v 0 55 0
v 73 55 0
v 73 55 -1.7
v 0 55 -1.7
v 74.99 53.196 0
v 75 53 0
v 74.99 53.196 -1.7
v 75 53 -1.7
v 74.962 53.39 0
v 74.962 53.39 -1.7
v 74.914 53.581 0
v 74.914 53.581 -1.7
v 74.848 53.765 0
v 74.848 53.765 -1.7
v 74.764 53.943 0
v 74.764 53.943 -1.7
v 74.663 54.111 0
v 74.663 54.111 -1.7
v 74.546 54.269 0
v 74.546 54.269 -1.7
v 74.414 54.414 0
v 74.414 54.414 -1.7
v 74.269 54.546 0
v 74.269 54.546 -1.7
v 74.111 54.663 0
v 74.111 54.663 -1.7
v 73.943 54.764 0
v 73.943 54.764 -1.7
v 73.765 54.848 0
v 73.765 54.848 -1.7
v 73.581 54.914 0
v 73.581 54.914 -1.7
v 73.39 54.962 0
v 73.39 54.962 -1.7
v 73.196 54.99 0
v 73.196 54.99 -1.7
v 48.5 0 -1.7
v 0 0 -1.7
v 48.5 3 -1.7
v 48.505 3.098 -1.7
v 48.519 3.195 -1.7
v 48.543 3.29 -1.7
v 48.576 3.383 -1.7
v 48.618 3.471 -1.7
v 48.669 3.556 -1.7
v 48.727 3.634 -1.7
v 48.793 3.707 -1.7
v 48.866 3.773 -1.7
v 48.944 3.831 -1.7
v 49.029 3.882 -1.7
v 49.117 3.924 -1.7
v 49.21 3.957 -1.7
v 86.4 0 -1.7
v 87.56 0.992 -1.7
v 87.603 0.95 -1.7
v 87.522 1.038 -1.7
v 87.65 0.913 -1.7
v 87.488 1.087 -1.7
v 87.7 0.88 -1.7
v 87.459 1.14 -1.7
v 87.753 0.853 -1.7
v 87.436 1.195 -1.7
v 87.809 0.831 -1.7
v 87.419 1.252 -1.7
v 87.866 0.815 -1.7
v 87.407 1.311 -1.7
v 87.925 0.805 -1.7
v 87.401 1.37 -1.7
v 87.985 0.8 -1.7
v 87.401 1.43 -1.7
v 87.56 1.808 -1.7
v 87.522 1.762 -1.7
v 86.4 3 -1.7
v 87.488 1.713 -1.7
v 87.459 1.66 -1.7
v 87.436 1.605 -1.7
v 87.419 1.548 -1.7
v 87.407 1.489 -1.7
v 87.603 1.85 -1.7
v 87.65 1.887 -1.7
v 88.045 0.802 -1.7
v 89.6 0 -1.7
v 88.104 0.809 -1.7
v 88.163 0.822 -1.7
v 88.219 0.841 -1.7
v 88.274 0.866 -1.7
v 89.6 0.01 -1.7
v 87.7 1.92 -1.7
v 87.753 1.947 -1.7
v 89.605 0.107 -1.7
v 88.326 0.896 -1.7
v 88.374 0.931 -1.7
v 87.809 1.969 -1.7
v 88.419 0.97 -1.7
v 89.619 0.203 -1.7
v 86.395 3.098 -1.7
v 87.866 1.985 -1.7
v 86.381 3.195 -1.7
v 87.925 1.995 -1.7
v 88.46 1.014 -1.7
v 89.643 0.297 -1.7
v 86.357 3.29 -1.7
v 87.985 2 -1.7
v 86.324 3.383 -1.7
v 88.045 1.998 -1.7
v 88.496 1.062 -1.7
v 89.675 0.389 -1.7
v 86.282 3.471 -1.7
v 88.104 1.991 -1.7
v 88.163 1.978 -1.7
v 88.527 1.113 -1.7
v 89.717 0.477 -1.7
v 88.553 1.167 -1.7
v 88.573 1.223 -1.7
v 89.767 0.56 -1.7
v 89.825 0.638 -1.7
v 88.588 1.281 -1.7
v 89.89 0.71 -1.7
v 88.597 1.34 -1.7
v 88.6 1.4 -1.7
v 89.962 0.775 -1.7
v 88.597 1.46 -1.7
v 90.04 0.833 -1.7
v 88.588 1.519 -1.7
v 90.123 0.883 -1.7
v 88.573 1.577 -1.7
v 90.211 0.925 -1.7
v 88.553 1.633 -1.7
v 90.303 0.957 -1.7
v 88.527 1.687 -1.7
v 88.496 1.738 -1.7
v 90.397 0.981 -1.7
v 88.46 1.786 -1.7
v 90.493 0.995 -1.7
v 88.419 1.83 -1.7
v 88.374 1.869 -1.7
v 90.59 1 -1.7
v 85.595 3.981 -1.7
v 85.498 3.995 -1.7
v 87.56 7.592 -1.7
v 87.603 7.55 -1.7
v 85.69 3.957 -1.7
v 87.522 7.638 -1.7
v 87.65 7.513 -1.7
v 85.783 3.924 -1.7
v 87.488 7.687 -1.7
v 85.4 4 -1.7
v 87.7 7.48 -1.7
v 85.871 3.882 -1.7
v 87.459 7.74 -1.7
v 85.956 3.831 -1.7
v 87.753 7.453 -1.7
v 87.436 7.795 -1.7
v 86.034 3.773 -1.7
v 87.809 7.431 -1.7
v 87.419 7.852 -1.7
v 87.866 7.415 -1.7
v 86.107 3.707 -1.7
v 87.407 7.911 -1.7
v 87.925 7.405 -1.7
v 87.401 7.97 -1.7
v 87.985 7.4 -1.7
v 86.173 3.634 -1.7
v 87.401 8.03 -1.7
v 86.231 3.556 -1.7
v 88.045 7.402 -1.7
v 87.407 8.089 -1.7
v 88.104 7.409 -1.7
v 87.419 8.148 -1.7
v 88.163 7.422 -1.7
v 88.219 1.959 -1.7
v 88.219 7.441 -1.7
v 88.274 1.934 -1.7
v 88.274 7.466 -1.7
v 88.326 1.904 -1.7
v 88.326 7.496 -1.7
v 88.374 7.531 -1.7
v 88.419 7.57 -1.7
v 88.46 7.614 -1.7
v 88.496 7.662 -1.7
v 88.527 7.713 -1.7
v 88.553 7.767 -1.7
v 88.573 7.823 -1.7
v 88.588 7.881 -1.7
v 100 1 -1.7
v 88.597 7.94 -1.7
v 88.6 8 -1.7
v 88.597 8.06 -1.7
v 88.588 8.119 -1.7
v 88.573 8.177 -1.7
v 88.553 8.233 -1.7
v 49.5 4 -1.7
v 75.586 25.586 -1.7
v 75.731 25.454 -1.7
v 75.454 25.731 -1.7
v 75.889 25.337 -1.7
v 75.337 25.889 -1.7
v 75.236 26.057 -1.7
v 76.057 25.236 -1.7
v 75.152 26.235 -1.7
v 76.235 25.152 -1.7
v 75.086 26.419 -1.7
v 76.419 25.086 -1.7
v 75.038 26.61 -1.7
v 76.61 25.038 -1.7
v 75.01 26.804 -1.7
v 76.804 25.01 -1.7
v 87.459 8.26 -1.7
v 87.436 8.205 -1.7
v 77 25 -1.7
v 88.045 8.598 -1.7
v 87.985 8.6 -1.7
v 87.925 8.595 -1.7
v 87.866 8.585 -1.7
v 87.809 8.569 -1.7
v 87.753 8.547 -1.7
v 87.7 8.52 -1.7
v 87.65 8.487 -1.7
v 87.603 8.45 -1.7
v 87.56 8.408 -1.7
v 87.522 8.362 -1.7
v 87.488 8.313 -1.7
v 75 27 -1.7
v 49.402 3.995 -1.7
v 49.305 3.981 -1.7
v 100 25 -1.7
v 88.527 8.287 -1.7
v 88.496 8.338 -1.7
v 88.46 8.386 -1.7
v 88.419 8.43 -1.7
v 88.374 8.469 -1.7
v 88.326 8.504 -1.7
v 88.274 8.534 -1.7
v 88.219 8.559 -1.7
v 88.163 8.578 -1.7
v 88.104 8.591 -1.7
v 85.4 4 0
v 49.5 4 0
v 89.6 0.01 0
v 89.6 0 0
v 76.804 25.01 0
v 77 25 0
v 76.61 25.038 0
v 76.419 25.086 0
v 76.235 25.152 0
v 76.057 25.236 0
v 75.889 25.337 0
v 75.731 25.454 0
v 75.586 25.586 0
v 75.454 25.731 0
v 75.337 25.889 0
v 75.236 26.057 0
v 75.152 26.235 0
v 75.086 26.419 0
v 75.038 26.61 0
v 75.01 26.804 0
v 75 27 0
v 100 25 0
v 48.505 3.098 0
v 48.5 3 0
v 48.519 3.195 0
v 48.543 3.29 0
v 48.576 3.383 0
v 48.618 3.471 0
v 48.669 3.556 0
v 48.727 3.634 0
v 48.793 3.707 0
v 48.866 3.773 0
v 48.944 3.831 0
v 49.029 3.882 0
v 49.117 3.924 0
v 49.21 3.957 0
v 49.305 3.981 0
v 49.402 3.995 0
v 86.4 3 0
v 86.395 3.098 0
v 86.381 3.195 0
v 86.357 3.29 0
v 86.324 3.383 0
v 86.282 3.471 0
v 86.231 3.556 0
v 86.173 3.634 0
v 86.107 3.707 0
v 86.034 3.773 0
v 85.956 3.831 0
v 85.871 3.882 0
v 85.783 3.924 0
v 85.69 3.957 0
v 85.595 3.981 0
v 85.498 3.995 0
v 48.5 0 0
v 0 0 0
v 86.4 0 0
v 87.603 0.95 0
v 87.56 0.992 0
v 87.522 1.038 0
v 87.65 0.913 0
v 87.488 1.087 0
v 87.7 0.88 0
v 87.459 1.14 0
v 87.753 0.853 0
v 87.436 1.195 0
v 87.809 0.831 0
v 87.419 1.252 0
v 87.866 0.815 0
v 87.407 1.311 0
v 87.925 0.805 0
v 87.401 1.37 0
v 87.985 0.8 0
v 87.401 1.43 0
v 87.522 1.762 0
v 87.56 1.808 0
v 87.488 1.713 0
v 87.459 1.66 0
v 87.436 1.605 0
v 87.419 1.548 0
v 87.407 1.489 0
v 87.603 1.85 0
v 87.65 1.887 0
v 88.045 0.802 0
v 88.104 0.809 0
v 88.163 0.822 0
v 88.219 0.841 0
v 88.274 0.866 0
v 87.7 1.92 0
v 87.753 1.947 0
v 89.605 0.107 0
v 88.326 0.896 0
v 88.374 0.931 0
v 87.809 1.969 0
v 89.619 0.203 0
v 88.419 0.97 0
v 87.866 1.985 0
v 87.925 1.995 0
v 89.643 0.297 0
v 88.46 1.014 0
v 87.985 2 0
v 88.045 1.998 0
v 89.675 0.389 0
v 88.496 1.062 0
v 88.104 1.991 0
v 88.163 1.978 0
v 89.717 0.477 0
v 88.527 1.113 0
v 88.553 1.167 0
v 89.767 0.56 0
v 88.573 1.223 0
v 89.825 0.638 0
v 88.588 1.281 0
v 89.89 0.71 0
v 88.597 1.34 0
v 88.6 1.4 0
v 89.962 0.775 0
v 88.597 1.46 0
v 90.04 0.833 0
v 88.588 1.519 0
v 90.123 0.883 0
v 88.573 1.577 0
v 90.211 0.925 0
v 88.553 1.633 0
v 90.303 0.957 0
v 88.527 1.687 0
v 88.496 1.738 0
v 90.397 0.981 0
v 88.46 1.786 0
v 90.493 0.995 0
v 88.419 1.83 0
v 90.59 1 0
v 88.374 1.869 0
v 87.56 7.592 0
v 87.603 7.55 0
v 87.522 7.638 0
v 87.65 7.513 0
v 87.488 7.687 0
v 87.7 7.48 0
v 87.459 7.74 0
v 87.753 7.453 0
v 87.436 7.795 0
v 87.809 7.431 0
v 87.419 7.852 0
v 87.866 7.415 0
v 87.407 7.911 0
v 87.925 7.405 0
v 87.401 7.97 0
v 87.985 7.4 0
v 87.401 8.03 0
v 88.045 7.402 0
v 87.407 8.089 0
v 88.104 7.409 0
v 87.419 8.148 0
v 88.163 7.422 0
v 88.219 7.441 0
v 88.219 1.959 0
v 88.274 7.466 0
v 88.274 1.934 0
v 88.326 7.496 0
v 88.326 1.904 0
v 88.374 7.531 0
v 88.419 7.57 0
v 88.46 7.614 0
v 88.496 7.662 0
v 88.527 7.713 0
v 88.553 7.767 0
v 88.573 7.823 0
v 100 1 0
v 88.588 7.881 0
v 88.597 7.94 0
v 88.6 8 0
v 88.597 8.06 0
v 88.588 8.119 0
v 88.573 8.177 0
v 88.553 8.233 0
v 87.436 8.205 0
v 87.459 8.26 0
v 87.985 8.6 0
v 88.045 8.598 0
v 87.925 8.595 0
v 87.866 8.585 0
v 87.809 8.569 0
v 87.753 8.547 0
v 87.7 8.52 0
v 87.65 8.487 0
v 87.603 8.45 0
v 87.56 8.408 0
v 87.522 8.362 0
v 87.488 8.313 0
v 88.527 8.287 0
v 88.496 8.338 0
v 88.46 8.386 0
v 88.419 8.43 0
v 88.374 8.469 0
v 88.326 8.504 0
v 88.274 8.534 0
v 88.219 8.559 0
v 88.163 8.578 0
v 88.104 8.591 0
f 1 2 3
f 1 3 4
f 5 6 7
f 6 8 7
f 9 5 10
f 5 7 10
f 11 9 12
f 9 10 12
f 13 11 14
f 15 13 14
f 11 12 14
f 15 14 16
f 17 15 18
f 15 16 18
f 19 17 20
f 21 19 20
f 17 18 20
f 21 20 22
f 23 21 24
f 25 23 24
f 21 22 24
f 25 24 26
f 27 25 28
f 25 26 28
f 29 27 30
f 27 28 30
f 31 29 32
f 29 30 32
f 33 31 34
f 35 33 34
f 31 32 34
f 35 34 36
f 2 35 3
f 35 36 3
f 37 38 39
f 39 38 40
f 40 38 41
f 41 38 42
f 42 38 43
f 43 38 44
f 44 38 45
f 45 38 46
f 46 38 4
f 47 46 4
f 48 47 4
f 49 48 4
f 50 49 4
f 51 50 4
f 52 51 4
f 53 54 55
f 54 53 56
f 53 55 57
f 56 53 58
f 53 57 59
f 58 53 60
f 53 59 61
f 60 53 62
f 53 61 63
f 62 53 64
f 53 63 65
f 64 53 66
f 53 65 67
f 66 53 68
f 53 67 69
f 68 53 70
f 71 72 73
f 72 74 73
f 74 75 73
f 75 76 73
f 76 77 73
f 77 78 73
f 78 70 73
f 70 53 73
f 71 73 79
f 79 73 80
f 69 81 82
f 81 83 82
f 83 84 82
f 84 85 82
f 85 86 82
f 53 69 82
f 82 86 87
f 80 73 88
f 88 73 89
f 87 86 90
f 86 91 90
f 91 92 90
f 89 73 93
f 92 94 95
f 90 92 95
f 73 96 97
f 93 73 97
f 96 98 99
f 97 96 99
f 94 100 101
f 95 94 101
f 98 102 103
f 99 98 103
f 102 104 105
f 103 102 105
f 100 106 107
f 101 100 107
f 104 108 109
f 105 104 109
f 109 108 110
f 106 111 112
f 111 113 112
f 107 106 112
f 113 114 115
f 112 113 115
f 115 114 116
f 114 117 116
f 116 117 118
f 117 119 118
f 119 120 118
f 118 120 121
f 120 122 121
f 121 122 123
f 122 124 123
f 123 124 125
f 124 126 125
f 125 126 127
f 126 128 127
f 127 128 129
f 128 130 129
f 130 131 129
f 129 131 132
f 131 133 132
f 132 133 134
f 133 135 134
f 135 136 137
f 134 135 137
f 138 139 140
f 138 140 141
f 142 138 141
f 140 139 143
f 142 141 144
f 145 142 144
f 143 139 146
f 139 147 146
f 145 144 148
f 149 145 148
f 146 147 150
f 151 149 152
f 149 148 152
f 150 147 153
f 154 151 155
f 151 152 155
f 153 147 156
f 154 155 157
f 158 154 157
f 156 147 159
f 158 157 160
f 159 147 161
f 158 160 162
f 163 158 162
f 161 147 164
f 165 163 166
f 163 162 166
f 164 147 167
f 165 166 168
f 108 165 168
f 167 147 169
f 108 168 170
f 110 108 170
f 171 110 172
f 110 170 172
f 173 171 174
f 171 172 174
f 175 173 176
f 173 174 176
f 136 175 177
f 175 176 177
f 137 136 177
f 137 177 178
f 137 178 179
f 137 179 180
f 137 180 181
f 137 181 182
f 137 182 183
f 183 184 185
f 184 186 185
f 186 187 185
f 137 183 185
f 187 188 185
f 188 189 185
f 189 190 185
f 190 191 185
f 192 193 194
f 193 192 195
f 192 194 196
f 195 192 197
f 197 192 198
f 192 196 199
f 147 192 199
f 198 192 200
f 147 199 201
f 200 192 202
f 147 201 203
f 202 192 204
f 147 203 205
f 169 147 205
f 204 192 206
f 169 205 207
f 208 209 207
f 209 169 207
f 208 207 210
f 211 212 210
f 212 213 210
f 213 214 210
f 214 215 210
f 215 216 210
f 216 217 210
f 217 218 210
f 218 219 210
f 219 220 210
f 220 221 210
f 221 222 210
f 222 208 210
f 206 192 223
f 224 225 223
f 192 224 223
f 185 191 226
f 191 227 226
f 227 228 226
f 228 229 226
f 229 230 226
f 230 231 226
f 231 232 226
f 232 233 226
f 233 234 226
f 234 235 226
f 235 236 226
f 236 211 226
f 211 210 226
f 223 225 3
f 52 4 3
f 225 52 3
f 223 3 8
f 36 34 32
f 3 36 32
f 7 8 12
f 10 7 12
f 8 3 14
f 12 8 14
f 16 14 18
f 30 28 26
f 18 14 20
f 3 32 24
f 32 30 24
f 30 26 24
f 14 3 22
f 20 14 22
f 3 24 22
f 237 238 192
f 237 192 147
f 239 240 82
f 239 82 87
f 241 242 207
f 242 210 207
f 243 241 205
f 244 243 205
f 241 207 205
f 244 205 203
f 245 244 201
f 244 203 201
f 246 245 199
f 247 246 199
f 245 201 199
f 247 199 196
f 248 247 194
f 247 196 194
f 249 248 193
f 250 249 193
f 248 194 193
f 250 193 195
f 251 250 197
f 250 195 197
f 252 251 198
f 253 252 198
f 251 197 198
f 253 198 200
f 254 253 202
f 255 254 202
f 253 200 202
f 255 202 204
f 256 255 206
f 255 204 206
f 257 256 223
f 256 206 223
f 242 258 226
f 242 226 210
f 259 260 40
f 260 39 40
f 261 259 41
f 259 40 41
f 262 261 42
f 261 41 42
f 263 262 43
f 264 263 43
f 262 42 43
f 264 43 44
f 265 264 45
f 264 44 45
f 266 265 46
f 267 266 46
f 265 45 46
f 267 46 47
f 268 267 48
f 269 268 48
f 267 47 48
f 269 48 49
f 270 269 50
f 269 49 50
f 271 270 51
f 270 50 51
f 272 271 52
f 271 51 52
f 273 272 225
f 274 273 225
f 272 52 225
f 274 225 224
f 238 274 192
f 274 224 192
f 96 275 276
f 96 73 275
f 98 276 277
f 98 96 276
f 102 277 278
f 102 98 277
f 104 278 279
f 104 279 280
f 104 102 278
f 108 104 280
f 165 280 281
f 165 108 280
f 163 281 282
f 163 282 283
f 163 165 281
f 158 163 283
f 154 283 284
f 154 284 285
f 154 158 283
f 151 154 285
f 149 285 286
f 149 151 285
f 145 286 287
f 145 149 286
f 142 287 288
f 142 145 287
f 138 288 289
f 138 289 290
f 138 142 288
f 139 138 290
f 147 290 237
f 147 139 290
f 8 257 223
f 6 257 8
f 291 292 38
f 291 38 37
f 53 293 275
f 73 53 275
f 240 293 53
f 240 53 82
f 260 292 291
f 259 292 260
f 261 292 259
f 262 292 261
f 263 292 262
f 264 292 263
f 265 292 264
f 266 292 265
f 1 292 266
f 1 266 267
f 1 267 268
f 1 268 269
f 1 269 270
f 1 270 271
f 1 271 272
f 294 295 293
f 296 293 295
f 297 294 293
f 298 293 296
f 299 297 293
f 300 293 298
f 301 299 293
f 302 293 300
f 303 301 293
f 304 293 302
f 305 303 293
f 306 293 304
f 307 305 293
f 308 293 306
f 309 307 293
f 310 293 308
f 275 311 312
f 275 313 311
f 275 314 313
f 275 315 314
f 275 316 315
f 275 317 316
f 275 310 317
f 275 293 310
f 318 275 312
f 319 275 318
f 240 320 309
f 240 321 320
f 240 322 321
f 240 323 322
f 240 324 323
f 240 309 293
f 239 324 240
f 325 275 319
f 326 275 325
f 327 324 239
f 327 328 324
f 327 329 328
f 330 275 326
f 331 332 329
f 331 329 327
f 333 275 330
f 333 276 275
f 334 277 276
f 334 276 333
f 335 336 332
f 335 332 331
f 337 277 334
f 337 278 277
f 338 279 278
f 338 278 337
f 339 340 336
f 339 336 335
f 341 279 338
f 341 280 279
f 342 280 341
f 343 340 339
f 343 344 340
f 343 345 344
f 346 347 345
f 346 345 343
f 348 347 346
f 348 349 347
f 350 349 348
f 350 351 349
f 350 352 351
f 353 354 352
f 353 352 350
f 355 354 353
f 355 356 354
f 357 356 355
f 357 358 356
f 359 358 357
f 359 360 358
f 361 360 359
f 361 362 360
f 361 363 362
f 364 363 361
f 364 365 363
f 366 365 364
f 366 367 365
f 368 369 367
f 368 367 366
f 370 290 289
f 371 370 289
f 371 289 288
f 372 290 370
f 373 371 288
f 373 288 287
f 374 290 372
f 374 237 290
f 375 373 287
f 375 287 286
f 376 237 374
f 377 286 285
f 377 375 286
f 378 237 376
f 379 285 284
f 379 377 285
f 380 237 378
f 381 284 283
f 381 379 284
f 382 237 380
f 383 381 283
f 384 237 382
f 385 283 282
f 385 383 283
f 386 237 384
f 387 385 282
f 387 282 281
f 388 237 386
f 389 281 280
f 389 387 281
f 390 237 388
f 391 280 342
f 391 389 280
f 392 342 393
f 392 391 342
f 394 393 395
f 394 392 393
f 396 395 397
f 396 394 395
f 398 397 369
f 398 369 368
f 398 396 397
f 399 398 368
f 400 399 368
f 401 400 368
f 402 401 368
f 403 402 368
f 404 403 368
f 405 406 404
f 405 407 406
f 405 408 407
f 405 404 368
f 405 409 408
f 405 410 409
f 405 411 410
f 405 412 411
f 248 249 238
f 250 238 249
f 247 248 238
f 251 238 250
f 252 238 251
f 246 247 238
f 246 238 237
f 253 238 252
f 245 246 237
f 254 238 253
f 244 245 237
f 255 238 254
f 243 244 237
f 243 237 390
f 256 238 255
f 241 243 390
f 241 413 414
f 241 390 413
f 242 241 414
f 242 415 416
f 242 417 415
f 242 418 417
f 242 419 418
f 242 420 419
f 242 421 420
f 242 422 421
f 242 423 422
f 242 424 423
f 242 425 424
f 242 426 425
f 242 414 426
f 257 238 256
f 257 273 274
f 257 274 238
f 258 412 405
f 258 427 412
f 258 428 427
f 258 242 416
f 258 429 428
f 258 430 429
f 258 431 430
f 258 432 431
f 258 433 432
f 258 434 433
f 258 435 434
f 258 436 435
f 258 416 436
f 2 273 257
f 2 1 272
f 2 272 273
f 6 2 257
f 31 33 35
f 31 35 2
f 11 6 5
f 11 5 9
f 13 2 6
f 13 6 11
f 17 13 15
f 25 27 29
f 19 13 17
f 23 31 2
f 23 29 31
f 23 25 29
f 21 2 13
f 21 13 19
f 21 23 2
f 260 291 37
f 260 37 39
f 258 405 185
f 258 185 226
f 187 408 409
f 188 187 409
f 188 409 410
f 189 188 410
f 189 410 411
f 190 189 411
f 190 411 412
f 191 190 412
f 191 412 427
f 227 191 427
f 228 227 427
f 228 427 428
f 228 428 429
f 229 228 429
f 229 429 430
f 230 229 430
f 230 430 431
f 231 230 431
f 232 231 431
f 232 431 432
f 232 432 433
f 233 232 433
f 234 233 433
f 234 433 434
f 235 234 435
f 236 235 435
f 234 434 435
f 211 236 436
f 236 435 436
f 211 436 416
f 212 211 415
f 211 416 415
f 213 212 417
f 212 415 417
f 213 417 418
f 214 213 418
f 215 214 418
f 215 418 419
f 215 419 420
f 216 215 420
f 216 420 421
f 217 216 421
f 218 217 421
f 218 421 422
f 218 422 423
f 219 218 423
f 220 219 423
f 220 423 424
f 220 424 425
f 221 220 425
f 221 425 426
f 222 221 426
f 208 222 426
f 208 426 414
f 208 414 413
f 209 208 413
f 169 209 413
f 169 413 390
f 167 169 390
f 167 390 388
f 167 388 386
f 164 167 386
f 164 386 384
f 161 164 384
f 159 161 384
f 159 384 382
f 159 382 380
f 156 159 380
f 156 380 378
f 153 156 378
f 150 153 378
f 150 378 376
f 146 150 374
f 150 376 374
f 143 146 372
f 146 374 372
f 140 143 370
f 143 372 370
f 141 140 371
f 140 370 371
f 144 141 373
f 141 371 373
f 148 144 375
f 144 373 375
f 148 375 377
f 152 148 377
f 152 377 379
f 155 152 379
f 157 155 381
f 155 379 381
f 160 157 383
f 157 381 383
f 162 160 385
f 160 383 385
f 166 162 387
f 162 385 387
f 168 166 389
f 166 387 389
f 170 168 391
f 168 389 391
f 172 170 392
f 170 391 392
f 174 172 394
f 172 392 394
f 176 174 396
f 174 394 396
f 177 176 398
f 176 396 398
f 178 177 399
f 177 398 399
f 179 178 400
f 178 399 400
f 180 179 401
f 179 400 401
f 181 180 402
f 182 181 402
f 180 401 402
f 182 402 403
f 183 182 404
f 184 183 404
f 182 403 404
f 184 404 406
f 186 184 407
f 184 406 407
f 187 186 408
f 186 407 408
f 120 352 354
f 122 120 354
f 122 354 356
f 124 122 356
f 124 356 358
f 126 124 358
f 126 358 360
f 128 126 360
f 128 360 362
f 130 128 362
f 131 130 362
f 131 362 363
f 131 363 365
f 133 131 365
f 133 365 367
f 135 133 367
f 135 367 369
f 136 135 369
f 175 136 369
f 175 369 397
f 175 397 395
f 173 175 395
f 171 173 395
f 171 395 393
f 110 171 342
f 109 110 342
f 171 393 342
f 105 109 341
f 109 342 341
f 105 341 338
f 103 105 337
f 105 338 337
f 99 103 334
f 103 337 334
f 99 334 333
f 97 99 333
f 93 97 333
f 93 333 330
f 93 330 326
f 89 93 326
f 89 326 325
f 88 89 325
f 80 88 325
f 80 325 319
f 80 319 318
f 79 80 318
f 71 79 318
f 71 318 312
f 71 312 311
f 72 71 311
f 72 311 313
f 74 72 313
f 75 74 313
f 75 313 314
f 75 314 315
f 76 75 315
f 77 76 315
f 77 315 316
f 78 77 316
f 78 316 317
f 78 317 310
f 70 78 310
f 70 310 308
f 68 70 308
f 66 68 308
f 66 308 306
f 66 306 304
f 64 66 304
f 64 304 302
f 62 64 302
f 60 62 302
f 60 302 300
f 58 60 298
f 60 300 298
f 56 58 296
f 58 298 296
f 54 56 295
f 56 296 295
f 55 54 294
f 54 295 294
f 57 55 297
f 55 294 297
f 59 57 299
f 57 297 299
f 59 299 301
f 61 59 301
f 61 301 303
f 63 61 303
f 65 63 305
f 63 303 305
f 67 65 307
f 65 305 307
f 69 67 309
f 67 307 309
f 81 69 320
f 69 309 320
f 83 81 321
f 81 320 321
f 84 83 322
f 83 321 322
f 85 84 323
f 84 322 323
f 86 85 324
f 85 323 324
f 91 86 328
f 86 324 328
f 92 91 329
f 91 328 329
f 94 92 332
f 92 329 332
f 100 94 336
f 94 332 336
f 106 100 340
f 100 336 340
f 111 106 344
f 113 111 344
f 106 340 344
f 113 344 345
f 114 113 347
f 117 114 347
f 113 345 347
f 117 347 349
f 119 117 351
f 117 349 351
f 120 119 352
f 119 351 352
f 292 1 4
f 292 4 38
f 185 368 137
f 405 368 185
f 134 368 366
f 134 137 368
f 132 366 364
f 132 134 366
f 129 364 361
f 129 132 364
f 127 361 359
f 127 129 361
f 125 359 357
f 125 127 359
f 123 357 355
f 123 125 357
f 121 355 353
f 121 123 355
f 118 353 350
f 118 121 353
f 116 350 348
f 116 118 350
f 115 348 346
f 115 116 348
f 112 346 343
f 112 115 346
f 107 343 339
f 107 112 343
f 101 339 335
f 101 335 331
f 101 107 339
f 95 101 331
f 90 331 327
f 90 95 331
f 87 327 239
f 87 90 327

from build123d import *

# Parameters (mm, degrees)
PAD_DEPTH     = 1.7
SKETCH001_W   = 37.9
SKETCH001_H   = 4
SKETCH001_W_2 = 10.4
SKETCH001_H_2 = 1
POCKET_DEPTH  = 1.701
FILLET_R      = 1
FILLET002_R   = 2
FILLET003_R   = 0.99
SKETCH002_R   = 0.6
HOLE_DEPTH    = 25


with BuildPart() as part:
    # Sketch → Pad (new body)
    with BuildSketch(Plane.XY):
        Polygon((0, 0), (100, 0), (100, 25), (75, 25), (75, 55), (0, 55), align=None)
    extrude(amount=-PAD_DEPTH)

    # Sketch001 → Pocket (cut, through all)
    with BuildSketch(Plane.XY):
        with Locations((67.45, 2)):
            Rectangle(SKETCH001_W, SKETCH001_H)
        with Locations((94.8, 0.5)):
            Rectangle(SKETCH001_W_2, SKETCH001_H_2)
    extrude(amount=-POCKET_DEPTH, mode=Mode.SUBTRACT)

    # Fillet
    fillet_edges = [part.edges().sort_by_distance(p)[0] for p in [
        (48.5, 4, -0.85),
        (86.4, 4, -0.85),
    ]]
    fillet(fillet_edges, radius=FILLET_R)

    # Fillet002
    fillet002_edges = [part.edges().sort_by_distance(p)[0] for p in [
        (75, 55, -0.85),
        (75, 25, -0.85),
    ]]
    fillet(fillet002_edges, radius=FILLET002_R)

    # Fillet003
    fillet003_edges = [part.edges().sort_by_distance(p)[0] for p in [
        (89.6, 1, -0.85),
    ]]
    fillet(fillet003_edges, radius=FILLET003_R)

    # Sketch002 → Hole (cut)
    with BuildSketch(Plane.XY):
        with Locations((88, 1.4)):
            Circle(SKETCH002_R)
        with Locations((88, 8)):
            Circle(SKETCH002_R)
    extrude(amount=-HOLE_DEPTH, mode=Mode.SUBTRACT)


solid = part.part
